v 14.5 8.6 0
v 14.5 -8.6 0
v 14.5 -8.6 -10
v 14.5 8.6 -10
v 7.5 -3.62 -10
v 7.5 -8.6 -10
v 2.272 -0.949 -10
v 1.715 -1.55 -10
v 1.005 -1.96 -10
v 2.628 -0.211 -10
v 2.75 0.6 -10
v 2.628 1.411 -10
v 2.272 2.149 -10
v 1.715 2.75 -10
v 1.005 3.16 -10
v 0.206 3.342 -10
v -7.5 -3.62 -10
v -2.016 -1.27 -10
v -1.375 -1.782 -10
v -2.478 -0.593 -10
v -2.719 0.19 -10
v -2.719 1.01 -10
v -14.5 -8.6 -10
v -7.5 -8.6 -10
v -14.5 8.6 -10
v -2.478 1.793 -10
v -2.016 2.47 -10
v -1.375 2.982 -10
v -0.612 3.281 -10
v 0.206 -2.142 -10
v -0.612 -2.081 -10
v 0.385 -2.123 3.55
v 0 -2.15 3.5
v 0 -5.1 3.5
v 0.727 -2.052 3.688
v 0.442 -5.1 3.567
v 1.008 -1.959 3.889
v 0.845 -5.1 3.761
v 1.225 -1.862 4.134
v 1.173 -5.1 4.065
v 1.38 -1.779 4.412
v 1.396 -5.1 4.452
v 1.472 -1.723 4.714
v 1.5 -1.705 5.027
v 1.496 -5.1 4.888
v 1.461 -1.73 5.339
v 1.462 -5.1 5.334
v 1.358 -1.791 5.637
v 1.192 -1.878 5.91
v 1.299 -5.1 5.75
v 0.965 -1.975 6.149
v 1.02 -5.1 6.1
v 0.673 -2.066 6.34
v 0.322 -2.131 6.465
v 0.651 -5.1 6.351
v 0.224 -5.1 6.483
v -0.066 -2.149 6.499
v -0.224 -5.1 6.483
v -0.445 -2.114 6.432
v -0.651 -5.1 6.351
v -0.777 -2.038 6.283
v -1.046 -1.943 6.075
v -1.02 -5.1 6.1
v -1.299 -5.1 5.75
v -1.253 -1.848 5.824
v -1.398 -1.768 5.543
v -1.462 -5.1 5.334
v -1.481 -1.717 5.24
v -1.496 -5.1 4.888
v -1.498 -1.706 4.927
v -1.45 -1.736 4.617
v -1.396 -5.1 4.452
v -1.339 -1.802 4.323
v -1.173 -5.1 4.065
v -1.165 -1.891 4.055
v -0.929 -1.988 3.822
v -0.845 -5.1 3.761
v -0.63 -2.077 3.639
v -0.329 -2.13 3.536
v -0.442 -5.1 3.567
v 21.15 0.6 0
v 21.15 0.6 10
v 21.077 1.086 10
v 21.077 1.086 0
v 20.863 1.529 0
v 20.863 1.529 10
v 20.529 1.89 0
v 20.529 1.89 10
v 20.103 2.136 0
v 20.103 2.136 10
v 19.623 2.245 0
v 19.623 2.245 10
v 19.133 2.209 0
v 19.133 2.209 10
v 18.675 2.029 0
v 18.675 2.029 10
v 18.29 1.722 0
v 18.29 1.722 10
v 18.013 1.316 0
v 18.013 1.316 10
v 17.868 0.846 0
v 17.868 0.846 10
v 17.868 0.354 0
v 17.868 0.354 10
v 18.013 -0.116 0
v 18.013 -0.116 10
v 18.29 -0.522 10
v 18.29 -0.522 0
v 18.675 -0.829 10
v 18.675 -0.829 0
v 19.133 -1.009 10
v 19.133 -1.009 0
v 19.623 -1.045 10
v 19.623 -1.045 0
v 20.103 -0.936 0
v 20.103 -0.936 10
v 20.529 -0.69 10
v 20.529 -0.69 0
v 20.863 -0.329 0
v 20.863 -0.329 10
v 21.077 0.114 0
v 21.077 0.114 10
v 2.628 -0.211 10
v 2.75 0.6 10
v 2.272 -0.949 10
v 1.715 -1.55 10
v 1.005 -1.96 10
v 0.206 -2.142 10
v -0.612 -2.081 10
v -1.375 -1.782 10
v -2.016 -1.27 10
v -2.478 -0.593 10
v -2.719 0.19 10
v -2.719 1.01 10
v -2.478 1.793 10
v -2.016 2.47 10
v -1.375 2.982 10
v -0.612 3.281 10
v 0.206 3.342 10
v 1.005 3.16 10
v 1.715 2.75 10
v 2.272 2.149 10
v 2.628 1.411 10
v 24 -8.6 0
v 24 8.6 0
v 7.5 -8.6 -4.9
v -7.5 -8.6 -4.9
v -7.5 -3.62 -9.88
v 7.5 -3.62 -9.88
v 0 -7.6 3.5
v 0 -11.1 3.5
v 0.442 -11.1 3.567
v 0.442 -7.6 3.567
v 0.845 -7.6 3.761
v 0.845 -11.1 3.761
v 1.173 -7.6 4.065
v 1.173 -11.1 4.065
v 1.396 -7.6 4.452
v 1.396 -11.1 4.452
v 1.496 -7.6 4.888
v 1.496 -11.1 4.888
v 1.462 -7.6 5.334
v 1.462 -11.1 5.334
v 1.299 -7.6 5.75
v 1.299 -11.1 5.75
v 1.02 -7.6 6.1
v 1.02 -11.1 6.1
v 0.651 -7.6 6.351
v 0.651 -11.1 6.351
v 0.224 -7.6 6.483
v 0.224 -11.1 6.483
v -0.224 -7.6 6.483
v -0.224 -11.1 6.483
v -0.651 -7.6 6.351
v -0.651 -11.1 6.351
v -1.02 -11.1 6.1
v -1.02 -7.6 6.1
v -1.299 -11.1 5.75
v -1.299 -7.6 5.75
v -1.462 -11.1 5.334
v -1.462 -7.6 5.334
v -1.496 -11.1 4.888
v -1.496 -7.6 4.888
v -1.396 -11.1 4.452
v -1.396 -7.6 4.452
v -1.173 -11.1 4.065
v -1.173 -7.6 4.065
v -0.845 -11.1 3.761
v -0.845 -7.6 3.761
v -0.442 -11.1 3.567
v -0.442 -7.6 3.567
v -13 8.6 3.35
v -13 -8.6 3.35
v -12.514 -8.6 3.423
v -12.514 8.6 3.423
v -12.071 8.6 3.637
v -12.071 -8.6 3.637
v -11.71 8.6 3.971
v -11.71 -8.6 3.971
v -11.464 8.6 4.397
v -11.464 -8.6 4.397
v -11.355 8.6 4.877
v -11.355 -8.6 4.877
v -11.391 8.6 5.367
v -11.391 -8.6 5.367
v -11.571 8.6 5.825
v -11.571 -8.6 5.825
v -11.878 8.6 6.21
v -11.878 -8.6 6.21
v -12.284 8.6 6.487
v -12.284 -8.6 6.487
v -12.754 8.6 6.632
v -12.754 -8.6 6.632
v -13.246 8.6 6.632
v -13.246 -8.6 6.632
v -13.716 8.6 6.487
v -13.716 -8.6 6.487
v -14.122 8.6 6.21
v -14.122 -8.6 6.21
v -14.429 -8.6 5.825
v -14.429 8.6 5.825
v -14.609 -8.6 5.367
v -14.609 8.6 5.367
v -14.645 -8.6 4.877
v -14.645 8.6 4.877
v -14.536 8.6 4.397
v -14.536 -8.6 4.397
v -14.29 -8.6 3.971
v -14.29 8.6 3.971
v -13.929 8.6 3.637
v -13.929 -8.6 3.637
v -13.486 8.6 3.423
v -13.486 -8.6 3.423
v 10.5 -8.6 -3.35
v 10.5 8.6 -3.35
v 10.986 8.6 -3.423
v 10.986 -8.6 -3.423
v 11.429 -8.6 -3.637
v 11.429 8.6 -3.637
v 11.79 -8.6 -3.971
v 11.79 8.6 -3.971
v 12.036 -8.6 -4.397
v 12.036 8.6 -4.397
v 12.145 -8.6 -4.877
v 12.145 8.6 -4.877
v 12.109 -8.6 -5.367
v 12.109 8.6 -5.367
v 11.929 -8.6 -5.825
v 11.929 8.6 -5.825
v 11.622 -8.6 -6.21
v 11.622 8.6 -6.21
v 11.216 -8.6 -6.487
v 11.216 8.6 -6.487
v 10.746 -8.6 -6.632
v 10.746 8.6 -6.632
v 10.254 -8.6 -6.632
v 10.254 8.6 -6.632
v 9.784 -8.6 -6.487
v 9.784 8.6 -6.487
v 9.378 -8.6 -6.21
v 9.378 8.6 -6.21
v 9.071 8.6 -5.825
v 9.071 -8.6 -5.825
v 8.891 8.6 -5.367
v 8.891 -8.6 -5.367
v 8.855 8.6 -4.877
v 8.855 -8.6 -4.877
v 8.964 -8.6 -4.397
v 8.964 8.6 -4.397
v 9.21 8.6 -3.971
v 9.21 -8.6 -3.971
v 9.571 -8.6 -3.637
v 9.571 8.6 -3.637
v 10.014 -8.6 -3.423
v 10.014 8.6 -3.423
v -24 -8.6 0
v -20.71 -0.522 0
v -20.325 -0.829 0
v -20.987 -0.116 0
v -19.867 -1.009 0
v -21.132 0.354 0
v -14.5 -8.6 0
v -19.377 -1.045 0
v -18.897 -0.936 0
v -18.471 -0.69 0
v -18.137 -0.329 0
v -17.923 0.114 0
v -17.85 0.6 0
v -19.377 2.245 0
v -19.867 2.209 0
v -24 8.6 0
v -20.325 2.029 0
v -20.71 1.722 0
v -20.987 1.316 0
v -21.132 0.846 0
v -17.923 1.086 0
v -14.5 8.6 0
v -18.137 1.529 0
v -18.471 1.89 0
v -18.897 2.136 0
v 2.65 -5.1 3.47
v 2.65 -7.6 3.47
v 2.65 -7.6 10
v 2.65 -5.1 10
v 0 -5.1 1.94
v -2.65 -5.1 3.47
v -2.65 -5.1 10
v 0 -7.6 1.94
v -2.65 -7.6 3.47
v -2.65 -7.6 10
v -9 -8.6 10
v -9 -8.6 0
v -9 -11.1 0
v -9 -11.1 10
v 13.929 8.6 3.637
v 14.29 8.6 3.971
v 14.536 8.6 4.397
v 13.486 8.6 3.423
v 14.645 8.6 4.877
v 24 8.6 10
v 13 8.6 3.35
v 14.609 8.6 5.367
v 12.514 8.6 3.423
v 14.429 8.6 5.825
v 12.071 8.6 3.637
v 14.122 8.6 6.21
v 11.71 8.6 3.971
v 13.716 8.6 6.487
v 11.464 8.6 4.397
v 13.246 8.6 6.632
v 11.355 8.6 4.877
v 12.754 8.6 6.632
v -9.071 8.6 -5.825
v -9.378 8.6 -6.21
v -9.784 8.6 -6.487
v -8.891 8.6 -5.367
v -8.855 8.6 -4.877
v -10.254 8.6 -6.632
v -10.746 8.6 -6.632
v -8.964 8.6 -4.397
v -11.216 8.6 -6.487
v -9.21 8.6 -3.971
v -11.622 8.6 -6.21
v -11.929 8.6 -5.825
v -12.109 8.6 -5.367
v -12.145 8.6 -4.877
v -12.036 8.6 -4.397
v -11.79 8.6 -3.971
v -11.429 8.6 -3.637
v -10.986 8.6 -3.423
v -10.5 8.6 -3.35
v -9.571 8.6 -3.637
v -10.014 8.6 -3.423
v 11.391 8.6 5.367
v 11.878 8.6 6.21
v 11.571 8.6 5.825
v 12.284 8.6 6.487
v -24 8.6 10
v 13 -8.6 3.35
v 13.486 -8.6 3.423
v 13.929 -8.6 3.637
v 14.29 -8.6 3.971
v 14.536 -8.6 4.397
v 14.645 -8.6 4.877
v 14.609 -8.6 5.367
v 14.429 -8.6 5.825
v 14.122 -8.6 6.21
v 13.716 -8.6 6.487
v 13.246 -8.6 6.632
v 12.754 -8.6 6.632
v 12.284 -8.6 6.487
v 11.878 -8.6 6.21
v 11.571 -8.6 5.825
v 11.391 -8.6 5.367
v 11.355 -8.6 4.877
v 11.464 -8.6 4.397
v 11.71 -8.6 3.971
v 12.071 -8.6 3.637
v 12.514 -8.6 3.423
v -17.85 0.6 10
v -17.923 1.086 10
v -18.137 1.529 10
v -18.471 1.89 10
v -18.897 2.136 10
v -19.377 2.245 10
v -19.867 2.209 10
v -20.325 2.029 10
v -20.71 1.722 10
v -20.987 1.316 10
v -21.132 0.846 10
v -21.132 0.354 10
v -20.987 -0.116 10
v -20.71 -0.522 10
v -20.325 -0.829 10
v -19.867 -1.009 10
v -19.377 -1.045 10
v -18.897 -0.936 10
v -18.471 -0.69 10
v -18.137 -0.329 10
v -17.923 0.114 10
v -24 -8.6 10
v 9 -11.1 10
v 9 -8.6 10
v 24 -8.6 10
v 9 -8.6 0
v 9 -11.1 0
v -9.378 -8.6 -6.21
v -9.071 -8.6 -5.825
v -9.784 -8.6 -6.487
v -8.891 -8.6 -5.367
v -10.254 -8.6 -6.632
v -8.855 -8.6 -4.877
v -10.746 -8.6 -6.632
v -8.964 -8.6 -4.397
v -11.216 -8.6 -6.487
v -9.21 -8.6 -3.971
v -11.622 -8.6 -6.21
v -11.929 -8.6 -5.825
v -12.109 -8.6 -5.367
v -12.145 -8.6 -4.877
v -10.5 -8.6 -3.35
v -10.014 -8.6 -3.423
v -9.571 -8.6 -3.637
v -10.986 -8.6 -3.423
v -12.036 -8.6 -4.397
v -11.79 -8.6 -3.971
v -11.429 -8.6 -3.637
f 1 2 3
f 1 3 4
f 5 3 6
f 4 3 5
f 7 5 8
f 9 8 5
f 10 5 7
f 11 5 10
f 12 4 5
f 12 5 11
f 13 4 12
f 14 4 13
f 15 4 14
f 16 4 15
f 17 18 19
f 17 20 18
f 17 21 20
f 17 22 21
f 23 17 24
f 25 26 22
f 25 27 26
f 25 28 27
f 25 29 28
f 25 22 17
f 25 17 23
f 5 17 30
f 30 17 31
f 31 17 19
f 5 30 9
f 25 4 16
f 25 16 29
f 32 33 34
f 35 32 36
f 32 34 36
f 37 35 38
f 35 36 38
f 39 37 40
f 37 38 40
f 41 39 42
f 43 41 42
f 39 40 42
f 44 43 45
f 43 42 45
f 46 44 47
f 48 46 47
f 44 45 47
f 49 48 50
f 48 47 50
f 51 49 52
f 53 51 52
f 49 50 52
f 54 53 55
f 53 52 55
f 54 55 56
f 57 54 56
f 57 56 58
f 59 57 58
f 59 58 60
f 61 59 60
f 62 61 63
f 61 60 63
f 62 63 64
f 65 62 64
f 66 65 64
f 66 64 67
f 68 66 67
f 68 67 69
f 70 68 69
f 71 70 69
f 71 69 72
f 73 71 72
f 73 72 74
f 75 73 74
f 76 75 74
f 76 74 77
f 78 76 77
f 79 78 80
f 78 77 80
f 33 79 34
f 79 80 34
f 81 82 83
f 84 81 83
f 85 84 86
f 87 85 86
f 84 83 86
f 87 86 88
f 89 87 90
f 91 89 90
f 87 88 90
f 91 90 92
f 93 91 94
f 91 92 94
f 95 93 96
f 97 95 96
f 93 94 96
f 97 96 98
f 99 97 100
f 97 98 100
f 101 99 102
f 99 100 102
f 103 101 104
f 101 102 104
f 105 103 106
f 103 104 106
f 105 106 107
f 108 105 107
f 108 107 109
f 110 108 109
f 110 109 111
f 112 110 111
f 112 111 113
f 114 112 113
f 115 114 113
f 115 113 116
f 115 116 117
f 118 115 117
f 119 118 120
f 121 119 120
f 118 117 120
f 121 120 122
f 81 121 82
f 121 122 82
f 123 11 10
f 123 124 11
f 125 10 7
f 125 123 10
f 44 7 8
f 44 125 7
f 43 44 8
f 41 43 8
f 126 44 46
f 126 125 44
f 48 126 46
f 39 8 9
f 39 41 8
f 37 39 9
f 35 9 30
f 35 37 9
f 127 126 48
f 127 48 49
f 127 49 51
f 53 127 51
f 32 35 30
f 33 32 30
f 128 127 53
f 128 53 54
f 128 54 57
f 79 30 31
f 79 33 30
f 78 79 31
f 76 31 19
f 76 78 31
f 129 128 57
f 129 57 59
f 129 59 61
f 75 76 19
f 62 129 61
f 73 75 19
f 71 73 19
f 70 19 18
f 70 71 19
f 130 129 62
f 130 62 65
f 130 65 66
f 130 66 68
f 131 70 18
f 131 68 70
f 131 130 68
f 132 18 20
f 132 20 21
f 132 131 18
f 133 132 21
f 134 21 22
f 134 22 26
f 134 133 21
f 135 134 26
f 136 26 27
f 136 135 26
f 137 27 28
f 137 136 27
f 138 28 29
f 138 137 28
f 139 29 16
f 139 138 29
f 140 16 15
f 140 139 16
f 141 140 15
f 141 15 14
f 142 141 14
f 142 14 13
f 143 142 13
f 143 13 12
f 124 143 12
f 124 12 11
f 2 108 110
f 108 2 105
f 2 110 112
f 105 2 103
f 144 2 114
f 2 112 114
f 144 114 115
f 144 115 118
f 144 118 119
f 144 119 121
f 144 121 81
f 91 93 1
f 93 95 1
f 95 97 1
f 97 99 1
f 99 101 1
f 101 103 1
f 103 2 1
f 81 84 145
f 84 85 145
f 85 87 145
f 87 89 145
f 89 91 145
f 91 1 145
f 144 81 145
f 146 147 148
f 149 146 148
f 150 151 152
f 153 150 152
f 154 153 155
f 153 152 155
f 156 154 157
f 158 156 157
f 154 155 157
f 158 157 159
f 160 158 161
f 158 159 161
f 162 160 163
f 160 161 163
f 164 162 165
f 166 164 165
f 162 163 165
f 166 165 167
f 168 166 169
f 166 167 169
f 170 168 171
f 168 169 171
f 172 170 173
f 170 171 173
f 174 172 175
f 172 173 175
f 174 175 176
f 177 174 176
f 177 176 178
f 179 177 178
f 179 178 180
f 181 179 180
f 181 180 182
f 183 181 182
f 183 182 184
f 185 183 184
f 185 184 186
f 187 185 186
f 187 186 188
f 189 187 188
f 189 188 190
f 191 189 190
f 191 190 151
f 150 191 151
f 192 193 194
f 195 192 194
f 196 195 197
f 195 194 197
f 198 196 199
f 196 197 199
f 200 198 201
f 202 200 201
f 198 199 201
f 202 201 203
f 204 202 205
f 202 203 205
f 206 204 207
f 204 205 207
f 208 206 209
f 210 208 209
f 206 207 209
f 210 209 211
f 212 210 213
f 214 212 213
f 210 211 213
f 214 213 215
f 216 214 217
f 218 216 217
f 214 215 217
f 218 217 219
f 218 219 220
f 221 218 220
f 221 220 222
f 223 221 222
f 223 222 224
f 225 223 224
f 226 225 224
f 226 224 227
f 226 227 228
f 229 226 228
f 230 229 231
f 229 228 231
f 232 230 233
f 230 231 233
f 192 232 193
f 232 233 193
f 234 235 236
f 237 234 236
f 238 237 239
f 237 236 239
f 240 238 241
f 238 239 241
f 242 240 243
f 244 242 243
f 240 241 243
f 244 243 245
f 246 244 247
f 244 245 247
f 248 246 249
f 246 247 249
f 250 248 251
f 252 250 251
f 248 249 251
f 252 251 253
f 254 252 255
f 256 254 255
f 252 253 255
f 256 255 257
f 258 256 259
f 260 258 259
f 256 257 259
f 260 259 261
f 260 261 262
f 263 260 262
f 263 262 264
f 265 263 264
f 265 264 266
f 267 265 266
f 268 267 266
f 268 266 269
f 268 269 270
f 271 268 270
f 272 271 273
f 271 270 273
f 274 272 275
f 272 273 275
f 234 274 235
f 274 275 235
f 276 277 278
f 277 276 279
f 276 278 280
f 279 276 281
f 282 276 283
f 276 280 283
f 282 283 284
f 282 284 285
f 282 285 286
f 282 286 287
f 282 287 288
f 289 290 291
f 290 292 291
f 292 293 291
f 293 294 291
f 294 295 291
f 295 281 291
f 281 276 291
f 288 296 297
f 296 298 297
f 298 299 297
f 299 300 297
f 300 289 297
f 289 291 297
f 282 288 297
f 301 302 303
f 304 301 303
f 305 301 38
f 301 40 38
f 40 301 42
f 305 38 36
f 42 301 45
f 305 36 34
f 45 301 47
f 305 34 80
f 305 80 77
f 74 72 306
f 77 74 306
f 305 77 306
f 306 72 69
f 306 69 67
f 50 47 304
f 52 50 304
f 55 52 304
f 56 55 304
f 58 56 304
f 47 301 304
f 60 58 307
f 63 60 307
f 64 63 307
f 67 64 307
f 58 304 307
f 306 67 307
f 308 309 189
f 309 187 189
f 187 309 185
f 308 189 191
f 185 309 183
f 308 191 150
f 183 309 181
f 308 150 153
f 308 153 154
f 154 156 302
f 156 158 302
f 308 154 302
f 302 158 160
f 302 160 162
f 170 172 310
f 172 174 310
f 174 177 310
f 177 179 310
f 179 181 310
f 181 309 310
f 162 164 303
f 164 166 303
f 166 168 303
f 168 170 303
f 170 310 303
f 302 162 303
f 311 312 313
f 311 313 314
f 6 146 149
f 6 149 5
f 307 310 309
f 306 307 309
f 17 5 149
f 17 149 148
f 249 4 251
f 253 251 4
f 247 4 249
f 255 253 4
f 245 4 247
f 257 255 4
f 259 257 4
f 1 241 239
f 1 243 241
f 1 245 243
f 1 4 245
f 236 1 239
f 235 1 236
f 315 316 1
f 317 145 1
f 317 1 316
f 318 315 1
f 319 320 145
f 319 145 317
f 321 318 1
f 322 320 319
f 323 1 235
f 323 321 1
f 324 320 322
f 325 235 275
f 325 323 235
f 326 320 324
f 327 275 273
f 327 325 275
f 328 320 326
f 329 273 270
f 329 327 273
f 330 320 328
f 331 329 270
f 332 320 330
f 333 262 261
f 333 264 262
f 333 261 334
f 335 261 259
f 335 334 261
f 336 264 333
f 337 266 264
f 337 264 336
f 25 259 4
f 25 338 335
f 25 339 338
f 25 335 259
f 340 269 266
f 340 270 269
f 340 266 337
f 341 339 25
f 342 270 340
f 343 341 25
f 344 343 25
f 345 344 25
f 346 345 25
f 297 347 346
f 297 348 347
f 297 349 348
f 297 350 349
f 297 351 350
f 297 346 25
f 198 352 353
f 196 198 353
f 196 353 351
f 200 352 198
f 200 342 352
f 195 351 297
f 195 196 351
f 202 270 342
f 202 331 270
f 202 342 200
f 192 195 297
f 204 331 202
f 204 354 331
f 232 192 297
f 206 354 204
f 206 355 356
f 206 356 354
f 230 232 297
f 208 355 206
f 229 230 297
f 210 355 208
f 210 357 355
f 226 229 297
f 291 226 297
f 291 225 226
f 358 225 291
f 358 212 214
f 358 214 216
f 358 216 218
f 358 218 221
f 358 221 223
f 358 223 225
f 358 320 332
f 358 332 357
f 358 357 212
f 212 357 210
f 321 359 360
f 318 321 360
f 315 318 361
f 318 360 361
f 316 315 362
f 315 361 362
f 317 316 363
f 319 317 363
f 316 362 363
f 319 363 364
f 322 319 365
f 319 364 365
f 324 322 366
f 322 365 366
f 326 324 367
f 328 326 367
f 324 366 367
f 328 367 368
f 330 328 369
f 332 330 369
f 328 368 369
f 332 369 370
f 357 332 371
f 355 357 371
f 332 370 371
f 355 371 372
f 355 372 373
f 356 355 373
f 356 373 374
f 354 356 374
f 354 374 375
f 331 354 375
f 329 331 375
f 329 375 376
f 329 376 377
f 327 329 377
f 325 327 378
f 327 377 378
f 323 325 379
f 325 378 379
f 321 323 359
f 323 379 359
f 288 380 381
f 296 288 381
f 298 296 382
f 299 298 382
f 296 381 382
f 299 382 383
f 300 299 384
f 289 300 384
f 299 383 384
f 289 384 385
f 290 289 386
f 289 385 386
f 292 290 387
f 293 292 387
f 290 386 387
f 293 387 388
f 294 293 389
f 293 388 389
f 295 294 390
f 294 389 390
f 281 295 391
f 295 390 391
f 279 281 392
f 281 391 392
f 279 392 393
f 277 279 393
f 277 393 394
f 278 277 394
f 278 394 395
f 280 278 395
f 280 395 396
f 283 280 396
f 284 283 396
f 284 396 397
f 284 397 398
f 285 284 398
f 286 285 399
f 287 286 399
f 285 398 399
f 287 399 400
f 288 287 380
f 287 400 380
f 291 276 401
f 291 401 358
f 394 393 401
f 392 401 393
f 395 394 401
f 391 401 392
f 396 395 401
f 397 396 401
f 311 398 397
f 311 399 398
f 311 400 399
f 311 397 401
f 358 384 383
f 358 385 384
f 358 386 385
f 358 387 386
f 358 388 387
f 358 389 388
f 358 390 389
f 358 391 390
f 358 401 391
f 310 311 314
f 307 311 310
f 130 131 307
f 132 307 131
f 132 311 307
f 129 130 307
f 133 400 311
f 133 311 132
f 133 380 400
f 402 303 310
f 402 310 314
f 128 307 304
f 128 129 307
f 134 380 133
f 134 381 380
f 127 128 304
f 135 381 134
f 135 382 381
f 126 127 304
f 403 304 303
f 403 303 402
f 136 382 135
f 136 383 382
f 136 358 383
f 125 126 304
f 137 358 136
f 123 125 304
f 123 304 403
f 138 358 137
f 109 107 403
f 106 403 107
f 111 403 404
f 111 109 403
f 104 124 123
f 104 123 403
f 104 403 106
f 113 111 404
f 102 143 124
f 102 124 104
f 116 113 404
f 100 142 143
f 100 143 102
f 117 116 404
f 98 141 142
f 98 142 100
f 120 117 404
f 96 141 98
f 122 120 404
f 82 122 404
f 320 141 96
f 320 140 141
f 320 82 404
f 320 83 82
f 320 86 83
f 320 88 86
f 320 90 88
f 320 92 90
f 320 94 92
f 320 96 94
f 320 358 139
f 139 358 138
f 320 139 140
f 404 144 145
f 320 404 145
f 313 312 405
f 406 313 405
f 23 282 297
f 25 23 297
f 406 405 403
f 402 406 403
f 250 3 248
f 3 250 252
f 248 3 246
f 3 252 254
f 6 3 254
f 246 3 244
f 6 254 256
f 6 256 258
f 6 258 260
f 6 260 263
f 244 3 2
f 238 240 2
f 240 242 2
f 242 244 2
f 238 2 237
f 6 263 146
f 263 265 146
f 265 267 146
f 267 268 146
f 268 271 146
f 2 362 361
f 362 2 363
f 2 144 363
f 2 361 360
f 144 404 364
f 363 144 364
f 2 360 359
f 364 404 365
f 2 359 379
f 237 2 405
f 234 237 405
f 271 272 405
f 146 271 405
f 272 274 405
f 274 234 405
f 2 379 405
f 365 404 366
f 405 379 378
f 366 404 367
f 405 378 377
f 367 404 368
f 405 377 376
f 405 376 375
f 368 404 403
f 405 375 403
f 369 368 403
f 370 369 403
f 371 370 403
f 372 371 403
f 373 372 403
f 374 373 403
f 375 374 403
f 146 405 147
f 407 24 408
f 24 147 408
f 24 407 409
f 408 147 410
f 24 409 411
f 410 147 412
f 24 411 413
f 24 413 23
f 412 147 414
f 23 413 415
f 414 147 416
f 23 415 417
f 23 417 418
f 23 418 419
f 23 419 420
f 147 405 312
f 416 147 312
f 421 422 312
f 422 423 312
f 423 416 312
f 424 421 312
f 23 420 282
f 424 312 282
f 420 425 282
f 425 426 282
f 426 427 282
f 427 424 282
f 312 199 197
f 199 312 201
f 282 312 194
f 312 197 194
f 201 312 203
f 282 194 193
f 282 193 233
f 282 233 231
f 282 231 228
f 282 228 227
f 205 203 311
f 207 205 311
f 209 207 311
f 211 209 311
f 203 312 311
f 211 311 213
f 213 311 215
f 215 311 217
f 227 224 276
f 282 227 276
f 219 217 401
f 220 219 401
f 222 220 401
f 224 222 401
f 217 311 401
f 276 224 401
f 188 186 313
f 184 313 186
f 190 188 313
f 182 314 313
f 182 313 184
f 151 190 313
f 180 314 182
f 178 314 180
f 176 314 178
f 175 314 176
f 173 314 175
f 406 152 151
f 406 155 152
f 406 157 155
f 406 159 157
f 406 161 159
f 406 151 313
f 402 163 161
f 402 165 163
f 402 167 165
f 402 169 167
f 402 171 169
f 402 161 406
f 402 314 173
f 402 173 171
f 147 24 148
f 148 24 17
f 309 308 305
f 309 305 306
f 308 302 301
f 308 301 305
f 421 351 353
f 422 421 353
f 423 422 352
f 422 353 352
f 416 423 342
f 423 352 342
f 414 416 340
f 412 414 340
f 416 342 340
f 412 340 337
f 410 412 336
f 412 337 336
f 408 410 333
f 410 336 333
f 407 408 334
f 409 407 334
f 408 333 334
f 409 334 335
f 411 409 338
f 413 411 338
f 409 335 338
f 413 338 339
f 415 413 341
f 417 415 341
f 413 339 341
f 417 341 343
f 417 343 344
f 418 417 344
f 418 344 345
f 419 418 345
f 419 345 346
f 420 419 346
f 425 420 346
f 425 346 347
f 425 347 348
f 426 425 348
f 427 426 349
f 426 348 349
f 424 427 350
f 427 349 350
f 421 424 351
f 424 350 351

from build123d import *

# Parameters (mm, degrees)
SZKIC1_W                         = 48
SZKIC1_H                         = 17.2
DODANIE_WYCI_GNI_CIE1_DEPTH      = 10
SZKIC2_R                         = 1.65
WYTNIJ_WYCI_GNI_CIE1_DEPTH       = 10
SZKIC3_R                         = 2.75
WYTNIJ_WYCI_GNI_CIE2_DEPTH       = 10
SZKIC4_R                         = 1.65
WYTNIJ_WYCI_GNI_CIE3_DEPTH       = 17.2
SZKIC5_W                         = 29
SZKIC5_H                         = 17.2
SZKIC5_R                         = 2.75
DODANIE_WYCI_GNI_CIE2_DEPTH      = 10
SZKIC6_R                         = 1.65
WYTNIJ_WYCI_GNI_CIE4_DEPTH       = 17.2
SZKIC7_W                         = 15
SZKIC7_H                         = 9.959248908
WYTNIJ_WYCI_GNI_CIE5_DEPTH       = 0.1
SFAZOWANIE1_SIZE                 = 5
SZKIC9_R                         = 1.5
WYTNIJ_WYCI_GNI_CIE6_DEPTH       = 10
WYTNIJ_WYCI_GNI_CIE7_DEPTH       = 3.5
DODANIE_WYCI_GNI_CIE3_DEPTH      = 2.5
DODANIE_WYCI_GNI_CIE3_DEPTH_BACK = 1
SZKIC8_W                         = 18
SZKIC8_H                         = 10
WYTNIJ_WYCI_GNI_CIE8_START       = 7.5
SZKIC11_R                        = 1.5
WYTNIJ_WYCI_GNI_CIE8_DEPTH       = 7.5


with BuildPart() as part:
    # Szkic1 → Dodanie-wyciągnięcie1 (new body)
    with BuildSketch(Plane.XY):
        Rectangle(SZKIC1_W, SZKIC1_H)
    extrude(amount=DODANIE_WYCI_GNI_CIE1_DEPTH)

    # Szkic2 → Wytnij-wyciągnięcie1 (cut)
    with BuildSketch(Plane.XY.offset(10)):
        with Locations((-19.5, 0.6)):
            Circle(SZKIC2_R)
        with Locations((19.5, 0.6)):
            Circle(SZKIC2_R)
    extrude(amount=-WYTNIJ_WYCI_GNI_CIE1_DEPTH, mode=Mode.SUBTRACT)

    # Szkic3 → Wytnij-wyciągnięcie2 (cut)
    with BuildSketch(Plane.XY.offset(10)):
        with Locations((0, 0.6)):
            Circle(SZKIC3_R)
    extrude(amount=-WYTNIJ_WYCI_GNI_CIE2_DEPTH, mode=Mode.SUBTRACT)

    # Szkic4 → Wytnij-wyciągnięcie3 (cut)
    with BuildSketch(Plane.XZ.offset(8.6)):
        with Locations(Location((-13, 5, 0), (0, 0, 270))):
            Circle(SZKIC4_R)
        with Locations(Location((13, 5, 0), (0, 0, 270))):
            Circle(SZKIC4_R)
    extrude(amount=-WYTNIJ_WYCI_GNI_CIE3_DEPTH, mode=Mode.SUBTRACT)

    # Szkic5 → Dodanie-wyciągnięcie2 (add)
    with BuildSketch(Plane(origin=(0, 0, 0), x_dir=(-1, 0, 0), z_dir=(0, 0, -1))):
        Rectangle(SZKIC5_W, SZKIC5_H)
        with Locations(Location((0, 0.6, 0), (0, 0, 180))):
            Circle(SZKIC5_R, mode=Mode.SUBTRACT)
    extrude(amount=DODANIE_WYCI_GNI_CIE2_DEPTH)

    # Szkic6 → Wytnij-wyciągnięcie4 (cut)
    with BuildSketch(Plane(origin=(0, 8.6, 0), x_dir=(1, 0, 0), z_dir=(0, 1, 0))):
        with Locations(Location((-10.5, 5, 0), (0, 0, 270))):
            Circle(SZKIC6_R)
        with Locations(Location((10.5, 5, 0), (0, 0, 270))):
            Circle(SZKIC6_R)
    extrude(amount=-WYTNIJ_WYCI_GNI_CIE4_DEPTH, mode=Mode.SUBTRACT)

    # Szkic7 → Wytnij-wyciągnięcie5 (cut)
    with BuildSketch(Plane(origin=(0, 0, -10), x_dir=(-1, 0, 0), z_dir=(0, 0, -1))):
        with Locations((0, -8.6)):
            Rectangle(SZKIC7_W, SZKIC7_H)
    extrude(amount=-WYTNIJ_WYCI_GNI_CIE5_DEPTH, mode=Mode.SUBTRACT)

    # Sfazowanie1
    # the kernel refuses this chamfer: 5 mm, written as the material it takes off along each edge
    with BuildSketch(Plane(origin=(-7.5, -8.6, -9.9), x_dir=(0, -0.027495876610586317, 0.9996219169112968), z_dir=(1, 0, 0))) as sfazowanie1_piece_1_section:
        Polygon((SFAZOWANIE1_SIZE * 0.999621916911, -SFAZOWANIE1_SIZE * 0.0274958766106), (-SFAZOWANIE1_SIZE * 0.0274958766106, -SFAZOWANIE1_SIZE * 0.999621916911), (0, 0), align=None)
    sfazowanie1_piece_1 = extrude(amount=15, mode=Mode.PRIVATE)
    sfazowanie1_piece_1 = split(sfazowanie1_piece_1, bisect_by=Plane(origin=(0, -3.620375546, -8.233305768), z_dir=(0, -1, 0)), keep=Keep.TOP, mode=Mode.PRIVATE)
    add(sfazowanie1_piece_1, mode=Mode.SUBTRACT)

    # Szkic9 → Wytnij-wyciągnięcie6 (cut)
    with BuildSketch(Plane.XZ.offset(8.6)):
        with Locations(Location((0, 5, 0), (0, 0, 270))):
            Circle(SZKIC9_R)
    extrude(amount=-WYTNIJ_WYCI_GNI_CIE6_DEPTH, mode=Mode.SUBTRACT)

    # Szkic10 → Wytnij-wyciągnięcie7 (cut)
    with BuildSketch(Plane.XZ.offset(8.6)):
        Polygon((-2.65, 6.529978213), (-2.65, 10), (2.65, 10), (2.65, 6.529978213), (2.65, 3.470021787), (0, 1.940043573), (-2.65, 3.470021787), align=None)
    extrude(amount=-WYTNIJ_WYCI_GNI_CIE7_DEPTH, mode=Mode.SUBTRACT)

    # Szkic8 → Dodanie-wyciągnięcie3 (add, two sides: drawn at the far end of the back side and taken through both)
    with BuildSketch(Plane.XZ.offset(8.6).offset(-DODANIE_WYCI_GNI_CIE3_DEPTH_BACK)):
        with Locations((0, 5)):
            Rectangle(SZKIC8_W, SZKIC8_H)
    extrude(amount=DODANIE_WYCI_GNI_CIE3_DEPTH + DODANIE_WYCI_GNI_CIE3_DEPTH_BACK)

    # Szkic11 → Wytnij-wyciągnięcie8 (cut)
    with BuildSketch(Plane.XZ.offset(5.1).offset(WYTNIJ_WYCI_GNI_CIE8_START)):
        with Locations(Location((0, 5, 0), (0, 0, 270))):
            Circle(SZKIC11_R)
    extrude(amount=-WYTNIJ_WYCI_GNI_CIE8_DEPTH, mode=Mode.SUBTRACT)


solid = part.part
